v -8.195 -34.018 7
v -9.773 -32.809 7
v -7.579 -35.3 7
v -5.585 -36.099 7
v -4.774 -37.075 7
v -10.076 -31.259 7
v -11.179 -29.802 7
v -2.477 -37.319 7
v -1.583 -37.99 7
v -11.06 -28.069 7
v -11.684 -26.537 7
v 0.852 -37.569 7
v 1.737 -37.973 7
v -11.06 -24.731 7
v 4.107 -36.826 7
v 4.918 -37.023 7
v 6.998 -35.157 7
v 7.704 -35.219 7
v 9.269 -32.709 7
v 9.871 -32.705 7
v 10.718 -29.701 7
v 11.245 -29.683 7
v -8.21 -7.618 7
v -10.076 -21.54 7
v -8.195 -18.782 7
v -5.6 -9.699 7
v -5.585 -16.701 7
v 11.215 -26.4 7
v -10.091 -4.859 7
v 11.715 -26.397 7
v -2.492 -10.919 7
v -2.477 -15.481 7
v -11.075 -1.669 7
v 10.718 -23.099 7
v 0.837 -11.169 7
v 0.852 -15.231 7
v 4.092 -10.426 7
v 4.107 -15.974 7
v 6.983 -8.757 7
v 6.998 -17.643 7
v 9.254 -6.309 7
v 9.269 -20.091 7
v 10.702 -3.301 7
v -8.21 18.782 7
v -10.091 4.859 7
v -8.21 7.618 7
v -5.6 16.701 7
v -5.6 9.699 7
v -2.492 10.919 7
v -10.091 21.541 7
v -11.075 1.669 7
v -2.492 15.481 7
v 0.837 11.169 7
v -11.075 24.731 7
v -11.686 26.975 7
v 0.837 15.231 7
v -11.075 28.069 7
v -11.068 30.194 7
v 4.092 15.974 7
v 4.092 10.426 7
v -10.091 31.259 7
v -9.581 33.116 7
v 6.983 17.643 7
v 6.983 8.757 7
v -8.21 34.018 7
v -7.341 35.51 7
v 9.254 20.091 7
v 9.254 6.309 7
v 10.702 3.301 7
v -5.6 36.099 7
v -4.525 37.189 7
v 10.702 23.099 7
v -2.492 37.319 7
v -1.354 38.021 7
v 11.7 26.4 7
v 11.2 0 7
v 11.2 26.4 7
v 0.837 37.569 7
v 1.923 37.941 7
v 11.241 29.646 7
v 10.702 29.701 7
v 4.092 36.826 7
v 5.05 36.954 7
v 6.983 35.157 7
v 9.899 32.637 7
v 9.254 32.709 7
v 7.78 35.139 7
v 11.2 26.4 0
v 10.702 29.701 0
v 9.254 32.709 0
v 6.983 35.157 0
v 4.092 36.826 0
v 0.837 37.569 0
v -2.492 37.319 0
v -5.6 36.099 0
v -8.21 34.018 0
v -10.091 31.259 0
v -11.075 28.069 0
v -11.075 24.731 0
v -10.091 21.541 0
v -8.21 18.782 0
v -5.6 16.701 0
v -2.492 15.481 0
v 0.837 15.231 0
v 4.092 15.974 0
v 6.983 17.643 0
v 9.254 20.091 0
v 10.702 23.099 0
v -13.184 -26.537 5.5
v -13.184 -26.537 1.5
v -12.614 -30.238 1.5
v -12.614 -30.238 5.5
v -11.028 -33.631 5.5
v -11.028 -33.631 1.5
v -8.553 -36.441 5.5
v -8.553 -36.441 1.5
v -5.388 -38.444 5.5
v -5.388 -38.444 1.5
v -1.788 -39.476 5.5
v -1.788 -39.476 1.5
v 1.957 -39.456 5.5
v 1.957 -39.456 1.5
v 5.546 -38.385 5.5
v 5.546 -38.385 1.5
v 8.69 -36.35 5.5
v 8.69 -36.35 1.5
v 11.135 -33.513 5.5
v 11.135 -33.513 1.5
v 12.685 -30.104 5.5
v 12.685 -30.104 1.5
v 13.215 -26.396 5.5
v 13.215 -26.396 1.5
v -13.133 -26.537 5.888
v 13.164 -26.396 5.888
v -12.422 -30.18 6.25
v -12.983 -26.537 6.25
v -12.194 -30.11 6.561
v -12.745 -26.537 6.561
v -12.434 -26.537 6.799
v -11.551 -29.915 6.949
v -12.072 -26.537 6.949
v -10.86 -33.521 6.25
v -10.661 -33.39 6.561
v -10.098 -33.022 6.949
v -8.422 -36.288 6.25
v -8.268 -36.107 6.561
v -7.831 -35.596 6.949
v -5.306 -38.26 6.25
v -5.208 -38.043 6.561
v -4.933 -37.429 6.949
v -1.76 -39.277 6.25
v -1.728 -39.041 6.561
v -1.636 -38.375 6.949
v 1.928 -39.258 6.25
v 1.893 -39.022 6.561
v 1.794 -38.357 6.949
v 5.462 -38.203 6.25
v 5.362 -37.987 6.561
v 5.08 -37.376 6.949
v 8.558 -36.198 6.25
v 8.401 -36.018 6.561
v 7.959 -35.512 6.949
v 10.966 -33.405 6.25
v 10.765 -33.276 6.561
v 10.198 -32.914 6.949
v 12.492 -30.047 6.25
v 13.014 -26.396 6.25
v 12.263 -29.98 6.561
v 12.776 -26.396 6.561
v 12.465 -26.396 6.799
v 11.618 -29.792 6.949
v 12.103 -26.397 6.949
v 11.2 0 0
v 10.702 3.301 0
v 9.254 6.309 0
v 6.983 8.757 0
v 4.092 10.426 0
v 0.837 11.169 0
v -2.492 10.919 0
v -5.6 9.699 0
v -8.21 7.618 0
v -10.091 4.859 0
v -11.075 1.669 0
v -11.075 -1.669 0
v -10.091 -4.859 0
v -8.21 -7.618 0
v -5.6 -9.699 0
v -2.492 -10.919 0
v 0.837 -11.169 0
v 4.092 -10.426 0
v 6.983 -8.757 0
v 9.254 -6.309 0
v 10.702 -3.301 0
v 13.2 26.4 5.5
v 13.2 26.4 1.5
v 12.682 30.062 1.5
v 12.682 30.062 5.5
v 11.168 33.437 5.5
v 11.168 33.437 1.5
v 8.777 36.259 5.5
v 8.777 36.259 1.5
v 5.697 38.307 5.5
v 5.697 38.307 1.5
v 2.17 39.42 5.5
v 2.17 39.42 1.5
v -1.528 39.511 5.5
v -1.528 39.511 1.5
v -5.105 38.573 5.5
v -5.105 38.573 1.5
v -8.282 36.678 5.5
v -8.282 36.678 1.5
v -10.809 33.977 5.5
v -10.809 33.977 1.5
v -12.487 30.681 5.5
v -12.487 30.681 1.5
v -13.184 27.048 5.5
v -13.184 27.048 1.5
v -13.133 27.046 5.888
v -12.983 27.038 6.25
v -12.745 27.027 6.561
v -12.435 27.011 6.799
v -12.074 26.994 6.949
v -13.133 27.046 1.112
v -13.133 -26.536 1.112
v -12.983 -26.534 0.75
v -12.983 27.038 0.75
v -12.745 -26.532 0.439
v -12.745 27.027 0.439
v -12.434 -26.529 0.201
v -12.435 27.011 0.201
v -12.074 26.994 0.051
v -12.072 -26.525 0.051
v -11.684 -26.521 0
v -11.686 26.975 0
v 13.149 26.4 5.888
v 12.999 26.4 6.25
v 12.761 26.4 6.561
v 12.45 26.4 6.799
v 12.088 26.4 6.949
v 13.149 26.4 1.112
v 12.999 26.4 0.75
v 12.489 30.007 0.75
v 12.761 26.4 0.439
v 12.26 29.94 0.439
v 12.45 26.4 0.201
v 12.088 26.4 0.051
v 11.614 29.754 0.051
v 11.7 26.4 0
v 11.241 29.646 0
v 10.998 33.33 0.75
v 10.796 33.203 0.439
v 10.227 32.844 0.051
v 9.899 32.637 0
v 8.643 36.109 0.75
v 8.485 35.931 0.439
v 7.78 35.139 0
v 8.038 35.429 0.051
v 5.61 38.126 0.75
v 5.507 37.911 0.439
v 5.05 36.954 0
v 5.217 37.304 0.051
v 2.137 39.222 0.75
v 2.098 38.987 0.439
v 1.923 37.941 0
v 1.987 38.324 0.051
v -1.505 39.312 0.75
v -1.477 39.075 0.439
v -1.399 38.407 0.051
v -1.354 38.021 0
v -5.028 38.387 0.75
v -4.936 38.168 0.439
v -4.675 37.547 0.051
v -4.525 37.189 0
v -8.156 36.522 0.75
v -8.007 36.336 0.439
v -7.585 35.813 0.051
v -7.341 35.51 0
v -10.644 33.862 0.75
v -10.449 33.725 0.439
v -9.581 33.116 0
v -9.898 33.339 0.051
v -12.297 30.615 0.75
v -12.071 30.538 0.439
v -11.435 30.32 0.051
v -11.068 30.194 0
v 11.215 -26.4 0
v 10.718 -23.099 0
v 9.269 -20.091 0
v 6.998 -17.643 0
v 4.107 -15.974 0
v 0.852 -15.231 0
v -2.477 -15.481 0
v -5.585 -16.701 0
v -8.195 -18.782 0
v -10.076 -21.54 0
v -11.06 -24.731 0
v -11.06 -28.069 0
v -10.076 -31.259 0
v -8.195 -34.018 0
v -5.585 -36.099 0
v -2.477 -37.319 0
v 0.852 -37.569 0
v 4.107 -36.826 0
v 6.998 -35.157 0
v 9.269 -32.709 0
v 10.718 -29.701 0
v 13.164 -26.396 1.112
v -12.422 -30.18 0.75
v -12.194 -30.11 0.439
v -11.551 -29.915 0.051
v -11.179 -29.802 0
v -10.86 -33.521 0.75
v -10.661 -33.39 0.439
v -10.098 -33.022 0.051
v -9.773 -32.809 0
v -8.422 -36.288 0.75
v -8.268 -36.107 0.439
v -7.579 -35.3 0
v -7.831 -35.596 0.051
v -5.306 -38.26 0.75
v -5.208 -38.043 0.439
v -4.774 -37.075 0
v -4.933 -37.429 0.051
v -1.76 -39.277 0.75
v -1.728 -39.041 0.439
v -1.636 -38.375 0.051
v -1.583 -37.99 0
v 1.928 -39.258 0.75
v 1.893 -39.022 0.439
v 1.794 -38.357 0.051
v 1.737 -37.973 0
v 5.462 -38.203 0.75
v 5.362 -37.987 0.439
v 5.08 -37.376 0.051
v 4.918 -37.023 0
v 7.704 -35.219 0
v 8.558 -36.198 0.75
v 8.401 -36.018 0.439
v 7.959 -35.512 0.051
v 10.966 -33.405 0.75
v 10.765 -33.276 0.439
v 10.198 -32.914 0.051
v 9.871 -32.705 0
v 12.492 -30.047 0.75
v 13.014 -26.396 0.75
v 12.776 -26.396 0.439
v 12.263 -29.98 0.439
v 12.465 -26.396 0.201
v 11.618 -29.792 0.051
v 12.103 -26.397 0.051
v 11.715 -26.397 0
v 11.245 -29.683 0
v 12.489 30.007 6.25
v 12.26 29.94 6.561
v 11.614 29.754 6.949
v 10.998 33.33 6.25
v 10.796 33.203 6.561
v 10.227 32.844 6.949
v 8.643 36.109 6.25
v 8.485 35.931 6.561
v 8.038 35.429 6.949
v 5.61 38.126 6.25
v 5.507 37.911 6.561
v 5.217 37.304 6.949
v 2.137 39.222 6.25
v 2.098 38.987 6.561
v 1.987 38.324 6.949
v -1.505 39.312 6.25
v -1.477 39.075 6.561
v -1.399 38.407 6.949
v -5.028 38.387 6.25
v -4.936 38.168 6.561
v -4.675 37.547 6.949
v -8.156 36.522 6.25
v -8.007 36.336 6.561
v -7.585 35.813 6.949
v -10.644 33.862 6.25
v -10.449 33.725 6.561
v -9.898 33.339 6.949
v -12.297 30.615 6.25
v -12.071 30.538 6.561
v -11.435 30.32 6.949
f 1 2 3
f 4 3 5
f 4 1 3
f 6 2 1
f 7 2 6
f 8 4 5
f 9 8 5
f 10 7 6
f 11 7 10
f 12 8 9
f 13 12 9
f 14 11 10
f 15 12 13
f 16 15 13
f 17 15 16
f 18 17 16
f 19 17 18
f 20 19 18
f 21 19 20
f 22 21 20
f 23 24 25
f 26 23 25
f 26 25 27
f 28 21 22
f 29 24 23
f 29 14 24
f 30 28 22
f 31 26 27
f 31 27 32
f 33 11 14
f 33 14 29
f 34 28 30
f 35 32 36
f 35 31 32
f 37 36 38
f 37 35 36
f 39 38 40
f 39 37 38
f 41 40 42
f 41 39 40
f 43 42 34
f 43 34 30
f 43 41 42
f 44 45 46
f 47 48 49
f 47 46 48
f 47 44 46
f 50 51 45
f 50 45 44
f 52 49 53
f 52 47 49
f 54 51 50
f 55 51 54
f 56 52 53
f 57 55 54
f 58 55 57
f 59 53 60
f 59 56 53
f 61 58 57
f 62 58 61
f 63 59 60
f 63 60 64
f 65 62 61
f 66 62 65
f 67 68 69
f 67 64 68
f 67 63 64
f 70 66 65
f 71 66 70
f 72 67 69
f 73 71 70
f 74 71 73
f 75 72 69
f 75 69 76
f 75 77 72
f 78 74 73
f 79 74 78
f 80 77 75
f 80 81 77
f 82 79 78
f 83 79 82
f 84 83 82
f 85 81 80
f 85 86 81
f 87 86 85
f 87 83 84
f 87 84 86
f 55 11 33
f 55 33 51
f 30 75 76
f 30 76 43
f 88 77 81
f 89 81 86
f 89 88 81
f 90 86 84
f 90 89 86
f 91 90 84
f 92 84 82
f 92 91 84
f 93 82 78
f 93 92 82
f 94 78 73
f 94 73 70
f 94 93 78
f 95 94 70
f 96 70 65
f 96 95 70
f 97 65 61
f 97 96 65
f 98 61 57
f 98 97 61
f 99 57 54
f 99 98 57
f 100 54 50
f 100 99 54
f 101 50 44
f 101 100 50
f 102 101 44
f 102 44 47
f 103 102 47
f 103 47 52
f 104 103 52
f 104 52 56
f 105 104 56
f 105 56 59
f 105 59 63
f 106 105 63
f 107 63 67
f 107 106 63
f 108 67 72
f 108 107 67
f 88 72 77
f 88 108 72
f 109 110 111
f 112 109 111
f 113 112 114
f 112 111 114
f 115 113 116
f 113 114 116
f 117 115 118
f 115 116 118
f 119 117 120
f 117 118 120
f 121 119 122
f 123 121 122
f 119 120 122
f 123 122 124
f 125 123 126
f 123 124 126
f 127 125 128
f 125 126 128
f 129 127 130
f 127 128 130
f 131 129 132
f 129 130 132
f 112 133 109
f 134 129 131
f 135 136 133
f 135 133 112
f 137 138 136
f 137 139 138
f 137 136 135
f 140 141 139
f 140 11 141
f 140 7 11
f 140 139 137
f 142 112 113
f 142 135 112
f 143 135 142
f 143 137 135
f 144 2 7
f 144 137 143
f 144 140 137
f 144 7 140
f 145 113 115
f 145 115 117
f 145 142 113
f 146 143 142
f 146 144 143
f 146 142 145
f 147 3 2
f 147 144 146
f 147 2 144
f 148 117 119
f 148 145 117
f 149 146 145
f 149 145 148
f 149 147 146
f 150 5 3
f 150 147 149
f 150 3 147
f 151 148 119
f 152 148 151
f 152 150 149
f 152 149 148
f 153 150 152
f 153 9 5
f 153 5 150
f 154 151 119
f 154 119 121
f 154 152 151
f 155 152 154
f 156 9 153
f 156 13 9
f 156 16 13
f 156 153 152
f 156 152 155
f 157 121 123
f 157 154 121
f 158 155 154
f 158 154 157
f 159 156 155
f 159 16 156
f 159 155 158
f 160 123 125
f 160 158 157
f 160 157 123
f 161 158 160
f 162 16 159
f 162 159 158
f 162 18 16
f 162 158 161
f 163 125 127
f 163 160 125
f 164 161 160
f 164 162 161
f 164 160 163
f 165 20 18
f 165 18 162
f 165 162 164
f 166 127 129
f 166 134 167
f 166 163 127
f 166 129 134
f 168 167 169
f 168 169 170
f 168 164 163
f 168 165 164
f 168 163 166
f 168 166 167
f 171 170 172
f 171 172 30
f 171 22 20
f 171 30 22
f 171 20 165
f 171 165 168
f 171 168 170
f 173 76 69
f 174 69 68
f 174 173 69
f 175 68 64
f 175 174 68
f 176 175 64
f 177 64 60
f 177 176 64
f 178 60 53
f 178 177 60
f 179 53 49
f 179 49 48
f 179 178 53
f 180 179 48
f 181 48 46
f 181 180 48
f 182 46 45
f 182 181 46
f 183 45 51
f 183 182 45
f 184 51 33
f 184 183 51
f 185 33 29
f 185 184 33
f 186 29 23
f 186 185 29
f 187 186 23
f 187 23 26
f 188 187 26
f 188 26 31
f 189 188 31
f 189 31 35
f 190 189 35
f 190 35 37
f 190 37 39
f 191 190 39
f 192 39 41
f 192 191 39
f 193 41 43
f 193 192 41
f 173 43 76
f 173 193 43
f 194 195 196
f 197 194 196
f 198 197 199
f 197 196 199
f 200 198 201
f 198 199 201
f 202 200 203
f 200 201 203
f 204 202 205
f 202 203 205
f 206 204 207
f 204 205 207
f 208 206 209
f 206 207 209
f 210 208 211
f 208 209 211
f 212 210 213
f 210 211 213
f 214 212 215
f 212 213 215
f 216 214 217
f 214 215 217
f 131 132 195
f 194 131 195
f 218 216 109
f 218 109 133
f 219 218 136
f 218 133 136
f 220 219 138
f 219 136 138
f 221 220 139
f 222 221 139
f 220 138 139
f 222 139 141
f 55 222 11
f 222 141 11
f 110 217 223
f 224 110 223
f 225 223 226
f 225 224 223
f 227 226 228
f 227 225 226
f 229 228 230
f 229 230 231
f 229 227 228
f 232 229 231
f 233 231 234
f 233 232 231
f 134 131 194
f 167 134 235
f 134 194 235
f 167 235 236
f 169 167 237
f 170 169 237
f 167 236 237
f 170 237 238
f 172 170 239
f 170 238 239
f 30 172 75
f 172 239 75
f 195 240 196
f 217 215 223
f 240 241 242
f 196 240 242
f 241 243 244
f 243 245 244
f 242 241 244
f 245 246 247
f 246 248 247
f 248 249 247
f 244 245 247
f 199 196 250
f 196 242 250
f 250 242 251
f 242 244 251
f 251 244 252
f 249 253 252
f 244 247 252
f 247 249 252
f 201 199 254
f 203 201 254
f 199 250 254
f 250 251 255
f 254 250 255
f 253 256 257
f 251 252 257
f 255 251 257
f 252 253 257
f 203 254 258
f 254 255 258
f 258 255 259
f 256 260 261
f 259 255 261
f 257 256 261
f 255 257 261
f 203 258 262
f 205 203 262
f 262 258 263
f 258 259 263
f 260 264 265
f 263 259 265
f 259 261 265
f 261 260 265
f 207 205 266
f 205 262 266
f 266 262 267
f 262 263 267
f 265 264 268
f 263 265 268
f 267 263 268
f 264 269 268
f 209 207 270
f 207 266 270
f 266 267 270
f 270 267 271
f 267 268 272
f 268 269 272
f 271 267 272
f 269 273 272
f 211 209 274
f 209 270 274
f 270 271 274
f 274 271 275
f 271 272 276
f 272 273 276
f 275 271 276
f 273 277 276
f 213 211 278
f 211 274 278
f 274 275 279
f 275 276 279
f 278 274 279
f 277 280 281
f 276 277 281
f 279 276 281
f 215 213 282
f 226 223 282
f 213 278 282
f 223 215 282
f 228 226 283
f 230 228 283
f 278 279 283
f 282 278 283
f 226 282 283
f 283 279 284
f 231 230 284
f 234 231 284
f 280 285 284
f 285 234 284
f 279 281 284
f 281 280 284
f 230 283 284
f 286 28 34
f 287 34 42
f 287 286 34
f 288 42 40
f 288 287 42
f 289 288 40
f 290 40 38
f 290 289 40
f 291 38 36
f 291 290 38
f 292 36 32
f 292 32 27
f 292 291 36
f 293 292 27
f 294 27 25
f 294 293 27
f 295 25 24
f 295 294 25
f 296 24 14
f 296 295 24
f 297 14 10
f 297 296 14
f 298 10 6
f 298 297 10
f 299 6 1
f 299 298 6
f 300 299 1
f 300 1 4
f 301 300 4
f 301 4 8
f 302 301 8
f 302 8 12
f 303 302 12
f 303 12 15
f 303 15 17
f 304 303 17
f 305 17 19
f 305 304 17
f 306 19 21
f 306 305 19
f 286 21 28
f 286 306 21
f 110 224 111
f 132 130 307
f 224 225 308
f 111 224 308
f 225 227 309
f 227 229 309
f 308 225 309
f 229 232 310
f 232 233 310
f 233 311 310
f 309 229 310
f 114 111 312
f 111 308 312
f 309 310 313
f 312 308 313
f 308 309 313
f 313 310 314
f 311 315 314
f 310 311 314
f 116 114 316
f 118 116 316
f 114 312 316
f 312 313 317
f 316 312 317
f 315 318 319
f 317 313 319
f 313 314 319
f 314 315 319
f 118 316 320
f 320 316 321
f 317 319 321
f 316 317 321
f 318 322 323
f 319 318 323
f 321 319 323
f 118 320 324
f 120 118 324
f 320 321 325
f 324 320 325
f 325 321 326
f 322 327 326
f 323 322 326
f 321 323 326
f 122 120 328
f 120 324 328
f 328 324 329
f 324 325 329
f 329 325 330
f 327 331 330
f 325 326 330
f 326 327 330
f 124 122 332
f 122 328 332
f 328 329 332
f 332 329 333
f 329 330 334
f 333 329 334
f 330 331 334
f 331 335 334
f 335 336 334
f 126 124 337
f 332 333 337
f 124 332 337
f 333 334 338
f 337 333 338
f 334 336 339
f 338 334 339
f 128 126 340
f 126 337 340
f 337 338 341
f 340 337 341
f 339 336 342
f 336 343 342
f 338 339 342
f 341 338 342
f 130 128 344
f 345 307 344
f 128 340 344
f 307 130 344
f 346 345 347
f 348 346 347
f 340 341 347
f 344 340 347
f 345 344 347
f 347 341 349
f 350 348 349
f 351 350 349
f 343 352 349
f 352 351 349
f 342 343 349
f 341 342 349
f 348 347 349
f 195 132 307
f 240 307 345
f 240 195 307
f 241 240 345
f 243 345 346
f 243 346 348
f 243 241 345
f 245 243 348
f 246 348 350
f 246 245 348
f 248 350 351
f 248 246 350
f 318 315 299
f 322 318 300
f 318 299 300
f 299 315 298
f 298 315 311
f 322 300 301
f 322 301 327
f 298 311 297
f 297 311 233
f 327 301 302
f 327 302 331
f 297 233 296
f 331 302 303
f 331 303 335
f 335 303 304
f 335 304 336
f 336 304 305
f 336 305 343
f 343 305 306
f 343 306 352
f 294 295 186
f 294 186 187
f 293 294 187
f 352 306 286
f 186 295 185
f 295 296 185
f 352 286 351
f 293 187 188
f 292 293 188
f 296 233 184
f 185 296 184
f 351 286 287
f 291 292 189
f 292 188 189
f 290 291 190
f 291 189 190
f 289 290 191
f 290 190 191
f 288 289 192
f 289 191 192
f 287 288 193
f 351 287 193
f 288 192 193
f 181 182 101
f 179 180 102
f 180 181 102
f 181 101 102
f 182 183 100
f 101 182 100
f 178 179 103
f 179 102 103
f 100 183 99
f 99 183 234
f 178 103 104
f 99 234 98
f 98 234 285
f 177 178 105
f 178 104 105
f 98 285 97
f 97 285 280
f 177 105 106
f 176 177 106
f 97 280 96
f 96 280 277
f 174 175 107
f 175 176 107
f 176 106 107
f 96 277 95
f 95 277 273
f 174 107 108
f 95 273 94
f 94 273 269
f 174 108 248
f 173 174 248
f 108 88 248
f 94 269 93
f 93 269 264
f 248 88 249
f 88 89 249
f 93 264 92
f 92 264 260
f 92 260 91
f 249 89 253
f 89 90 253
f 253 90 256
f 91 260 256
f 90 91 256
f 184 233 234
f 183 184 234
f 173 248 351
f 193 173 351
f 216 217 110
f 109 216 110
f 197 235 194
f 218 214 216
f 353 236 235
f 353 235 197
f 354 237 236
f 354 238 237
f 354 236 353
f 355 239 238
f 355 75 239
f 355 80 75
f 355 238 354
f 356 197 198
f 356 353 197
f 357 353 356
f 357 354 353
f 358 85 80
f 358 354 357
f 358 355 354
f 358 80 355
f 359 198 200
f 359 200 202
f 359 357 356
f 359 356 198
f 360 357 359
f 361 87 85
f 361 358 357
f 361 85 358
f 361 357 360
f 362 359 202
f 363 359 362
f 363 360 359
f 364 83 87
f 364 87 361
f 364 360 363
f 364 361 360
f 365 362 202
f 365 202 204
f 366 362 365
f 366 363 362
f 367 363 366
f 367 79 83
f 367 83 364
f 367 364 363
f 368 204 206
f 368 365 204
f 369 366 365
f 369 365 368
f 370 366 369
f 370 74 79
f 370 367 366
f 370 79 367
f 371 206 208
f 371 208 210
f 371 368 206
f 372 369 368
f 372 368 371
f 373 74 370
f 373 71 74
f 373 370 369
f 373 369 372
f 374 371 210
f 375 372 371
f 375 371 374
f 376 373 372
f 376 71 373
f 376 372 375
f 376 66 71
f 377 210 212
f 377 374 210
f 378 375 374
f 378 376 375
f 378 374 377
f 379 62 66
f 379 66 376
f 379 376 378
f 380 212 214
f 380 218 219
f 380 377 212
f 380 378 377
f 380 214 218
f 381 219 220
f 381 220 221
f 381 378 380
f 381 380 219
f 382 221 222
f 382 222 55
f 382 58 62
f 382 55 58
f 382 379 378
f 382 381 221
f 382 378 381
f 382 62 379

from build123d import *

# Parameters (mm, degrees)
F0_R     = 11.2
F1_DEPTH = 7
F2_R     = 1.5


with BuildPart() as f1:
    # F0 (on Top) → F1 (new body)
    with BuildSketch(Plane.XY):
        with BuildLine():
            Line((-13.1840748528, 25.7517945722), (-13.1840748528, 0.6482054278))
            Line((-13.1840748528, 0.6482054278), (-13.1840748528, -0.6482054278))
            Line((-13.1840748528, -0.6482054278), (-13.1840748528, -26.2634836304))
            Line((-13.1840748528, -26.2634836304), (-13.1840748528, -26.5365075959))
            ThreePointArc((-13.1840748528, -26.5365075959), (0.0853785885, -39.5998091598), (13.215218689, -26.3961906666))
            Line((13.215218689, -26.3961906666), (13.2, 26.4))
            ThreePointArc((13.2, 26.4), (0.3242005116, 39.5960181126), (-13.1840748528, 27.0482054278))
            Line((-13.1840748528, 27.0482054278), (-13.1840748528, 25.7517945722))
        make_face()
        Circle(F0_R, mode=Mode.SUBTRACT)
        with Locations((0.0152192374, -26.3999956132)):
            Circle(F0_R, mode=Mode.SUBTRACT)
        with Locations((0, 26.4)):
            Circle(F0_R, mode=Mode.SUBTRACT)
    extrude(amount=F1_DEPTH)

    # F2
    f2_edges = [f1.edges().sort_by_distance(p)[0] for p in [
        (0.085379, -39.599809, 0),
        (0.324201, 39.596018, 0),
        (0.324201, 39.596018, 7),
        (-13.184075, 0.255849, 7),
        (13.207609, 0.001905, 7),
        (13.207609, 0.001905, 0),
        (-13.184075, 0.255849, 0),
        (0.085379, -39.599809, 7),
    ]]
    fillet(f2_edges, radius=F2_R)


solid = f1.part
